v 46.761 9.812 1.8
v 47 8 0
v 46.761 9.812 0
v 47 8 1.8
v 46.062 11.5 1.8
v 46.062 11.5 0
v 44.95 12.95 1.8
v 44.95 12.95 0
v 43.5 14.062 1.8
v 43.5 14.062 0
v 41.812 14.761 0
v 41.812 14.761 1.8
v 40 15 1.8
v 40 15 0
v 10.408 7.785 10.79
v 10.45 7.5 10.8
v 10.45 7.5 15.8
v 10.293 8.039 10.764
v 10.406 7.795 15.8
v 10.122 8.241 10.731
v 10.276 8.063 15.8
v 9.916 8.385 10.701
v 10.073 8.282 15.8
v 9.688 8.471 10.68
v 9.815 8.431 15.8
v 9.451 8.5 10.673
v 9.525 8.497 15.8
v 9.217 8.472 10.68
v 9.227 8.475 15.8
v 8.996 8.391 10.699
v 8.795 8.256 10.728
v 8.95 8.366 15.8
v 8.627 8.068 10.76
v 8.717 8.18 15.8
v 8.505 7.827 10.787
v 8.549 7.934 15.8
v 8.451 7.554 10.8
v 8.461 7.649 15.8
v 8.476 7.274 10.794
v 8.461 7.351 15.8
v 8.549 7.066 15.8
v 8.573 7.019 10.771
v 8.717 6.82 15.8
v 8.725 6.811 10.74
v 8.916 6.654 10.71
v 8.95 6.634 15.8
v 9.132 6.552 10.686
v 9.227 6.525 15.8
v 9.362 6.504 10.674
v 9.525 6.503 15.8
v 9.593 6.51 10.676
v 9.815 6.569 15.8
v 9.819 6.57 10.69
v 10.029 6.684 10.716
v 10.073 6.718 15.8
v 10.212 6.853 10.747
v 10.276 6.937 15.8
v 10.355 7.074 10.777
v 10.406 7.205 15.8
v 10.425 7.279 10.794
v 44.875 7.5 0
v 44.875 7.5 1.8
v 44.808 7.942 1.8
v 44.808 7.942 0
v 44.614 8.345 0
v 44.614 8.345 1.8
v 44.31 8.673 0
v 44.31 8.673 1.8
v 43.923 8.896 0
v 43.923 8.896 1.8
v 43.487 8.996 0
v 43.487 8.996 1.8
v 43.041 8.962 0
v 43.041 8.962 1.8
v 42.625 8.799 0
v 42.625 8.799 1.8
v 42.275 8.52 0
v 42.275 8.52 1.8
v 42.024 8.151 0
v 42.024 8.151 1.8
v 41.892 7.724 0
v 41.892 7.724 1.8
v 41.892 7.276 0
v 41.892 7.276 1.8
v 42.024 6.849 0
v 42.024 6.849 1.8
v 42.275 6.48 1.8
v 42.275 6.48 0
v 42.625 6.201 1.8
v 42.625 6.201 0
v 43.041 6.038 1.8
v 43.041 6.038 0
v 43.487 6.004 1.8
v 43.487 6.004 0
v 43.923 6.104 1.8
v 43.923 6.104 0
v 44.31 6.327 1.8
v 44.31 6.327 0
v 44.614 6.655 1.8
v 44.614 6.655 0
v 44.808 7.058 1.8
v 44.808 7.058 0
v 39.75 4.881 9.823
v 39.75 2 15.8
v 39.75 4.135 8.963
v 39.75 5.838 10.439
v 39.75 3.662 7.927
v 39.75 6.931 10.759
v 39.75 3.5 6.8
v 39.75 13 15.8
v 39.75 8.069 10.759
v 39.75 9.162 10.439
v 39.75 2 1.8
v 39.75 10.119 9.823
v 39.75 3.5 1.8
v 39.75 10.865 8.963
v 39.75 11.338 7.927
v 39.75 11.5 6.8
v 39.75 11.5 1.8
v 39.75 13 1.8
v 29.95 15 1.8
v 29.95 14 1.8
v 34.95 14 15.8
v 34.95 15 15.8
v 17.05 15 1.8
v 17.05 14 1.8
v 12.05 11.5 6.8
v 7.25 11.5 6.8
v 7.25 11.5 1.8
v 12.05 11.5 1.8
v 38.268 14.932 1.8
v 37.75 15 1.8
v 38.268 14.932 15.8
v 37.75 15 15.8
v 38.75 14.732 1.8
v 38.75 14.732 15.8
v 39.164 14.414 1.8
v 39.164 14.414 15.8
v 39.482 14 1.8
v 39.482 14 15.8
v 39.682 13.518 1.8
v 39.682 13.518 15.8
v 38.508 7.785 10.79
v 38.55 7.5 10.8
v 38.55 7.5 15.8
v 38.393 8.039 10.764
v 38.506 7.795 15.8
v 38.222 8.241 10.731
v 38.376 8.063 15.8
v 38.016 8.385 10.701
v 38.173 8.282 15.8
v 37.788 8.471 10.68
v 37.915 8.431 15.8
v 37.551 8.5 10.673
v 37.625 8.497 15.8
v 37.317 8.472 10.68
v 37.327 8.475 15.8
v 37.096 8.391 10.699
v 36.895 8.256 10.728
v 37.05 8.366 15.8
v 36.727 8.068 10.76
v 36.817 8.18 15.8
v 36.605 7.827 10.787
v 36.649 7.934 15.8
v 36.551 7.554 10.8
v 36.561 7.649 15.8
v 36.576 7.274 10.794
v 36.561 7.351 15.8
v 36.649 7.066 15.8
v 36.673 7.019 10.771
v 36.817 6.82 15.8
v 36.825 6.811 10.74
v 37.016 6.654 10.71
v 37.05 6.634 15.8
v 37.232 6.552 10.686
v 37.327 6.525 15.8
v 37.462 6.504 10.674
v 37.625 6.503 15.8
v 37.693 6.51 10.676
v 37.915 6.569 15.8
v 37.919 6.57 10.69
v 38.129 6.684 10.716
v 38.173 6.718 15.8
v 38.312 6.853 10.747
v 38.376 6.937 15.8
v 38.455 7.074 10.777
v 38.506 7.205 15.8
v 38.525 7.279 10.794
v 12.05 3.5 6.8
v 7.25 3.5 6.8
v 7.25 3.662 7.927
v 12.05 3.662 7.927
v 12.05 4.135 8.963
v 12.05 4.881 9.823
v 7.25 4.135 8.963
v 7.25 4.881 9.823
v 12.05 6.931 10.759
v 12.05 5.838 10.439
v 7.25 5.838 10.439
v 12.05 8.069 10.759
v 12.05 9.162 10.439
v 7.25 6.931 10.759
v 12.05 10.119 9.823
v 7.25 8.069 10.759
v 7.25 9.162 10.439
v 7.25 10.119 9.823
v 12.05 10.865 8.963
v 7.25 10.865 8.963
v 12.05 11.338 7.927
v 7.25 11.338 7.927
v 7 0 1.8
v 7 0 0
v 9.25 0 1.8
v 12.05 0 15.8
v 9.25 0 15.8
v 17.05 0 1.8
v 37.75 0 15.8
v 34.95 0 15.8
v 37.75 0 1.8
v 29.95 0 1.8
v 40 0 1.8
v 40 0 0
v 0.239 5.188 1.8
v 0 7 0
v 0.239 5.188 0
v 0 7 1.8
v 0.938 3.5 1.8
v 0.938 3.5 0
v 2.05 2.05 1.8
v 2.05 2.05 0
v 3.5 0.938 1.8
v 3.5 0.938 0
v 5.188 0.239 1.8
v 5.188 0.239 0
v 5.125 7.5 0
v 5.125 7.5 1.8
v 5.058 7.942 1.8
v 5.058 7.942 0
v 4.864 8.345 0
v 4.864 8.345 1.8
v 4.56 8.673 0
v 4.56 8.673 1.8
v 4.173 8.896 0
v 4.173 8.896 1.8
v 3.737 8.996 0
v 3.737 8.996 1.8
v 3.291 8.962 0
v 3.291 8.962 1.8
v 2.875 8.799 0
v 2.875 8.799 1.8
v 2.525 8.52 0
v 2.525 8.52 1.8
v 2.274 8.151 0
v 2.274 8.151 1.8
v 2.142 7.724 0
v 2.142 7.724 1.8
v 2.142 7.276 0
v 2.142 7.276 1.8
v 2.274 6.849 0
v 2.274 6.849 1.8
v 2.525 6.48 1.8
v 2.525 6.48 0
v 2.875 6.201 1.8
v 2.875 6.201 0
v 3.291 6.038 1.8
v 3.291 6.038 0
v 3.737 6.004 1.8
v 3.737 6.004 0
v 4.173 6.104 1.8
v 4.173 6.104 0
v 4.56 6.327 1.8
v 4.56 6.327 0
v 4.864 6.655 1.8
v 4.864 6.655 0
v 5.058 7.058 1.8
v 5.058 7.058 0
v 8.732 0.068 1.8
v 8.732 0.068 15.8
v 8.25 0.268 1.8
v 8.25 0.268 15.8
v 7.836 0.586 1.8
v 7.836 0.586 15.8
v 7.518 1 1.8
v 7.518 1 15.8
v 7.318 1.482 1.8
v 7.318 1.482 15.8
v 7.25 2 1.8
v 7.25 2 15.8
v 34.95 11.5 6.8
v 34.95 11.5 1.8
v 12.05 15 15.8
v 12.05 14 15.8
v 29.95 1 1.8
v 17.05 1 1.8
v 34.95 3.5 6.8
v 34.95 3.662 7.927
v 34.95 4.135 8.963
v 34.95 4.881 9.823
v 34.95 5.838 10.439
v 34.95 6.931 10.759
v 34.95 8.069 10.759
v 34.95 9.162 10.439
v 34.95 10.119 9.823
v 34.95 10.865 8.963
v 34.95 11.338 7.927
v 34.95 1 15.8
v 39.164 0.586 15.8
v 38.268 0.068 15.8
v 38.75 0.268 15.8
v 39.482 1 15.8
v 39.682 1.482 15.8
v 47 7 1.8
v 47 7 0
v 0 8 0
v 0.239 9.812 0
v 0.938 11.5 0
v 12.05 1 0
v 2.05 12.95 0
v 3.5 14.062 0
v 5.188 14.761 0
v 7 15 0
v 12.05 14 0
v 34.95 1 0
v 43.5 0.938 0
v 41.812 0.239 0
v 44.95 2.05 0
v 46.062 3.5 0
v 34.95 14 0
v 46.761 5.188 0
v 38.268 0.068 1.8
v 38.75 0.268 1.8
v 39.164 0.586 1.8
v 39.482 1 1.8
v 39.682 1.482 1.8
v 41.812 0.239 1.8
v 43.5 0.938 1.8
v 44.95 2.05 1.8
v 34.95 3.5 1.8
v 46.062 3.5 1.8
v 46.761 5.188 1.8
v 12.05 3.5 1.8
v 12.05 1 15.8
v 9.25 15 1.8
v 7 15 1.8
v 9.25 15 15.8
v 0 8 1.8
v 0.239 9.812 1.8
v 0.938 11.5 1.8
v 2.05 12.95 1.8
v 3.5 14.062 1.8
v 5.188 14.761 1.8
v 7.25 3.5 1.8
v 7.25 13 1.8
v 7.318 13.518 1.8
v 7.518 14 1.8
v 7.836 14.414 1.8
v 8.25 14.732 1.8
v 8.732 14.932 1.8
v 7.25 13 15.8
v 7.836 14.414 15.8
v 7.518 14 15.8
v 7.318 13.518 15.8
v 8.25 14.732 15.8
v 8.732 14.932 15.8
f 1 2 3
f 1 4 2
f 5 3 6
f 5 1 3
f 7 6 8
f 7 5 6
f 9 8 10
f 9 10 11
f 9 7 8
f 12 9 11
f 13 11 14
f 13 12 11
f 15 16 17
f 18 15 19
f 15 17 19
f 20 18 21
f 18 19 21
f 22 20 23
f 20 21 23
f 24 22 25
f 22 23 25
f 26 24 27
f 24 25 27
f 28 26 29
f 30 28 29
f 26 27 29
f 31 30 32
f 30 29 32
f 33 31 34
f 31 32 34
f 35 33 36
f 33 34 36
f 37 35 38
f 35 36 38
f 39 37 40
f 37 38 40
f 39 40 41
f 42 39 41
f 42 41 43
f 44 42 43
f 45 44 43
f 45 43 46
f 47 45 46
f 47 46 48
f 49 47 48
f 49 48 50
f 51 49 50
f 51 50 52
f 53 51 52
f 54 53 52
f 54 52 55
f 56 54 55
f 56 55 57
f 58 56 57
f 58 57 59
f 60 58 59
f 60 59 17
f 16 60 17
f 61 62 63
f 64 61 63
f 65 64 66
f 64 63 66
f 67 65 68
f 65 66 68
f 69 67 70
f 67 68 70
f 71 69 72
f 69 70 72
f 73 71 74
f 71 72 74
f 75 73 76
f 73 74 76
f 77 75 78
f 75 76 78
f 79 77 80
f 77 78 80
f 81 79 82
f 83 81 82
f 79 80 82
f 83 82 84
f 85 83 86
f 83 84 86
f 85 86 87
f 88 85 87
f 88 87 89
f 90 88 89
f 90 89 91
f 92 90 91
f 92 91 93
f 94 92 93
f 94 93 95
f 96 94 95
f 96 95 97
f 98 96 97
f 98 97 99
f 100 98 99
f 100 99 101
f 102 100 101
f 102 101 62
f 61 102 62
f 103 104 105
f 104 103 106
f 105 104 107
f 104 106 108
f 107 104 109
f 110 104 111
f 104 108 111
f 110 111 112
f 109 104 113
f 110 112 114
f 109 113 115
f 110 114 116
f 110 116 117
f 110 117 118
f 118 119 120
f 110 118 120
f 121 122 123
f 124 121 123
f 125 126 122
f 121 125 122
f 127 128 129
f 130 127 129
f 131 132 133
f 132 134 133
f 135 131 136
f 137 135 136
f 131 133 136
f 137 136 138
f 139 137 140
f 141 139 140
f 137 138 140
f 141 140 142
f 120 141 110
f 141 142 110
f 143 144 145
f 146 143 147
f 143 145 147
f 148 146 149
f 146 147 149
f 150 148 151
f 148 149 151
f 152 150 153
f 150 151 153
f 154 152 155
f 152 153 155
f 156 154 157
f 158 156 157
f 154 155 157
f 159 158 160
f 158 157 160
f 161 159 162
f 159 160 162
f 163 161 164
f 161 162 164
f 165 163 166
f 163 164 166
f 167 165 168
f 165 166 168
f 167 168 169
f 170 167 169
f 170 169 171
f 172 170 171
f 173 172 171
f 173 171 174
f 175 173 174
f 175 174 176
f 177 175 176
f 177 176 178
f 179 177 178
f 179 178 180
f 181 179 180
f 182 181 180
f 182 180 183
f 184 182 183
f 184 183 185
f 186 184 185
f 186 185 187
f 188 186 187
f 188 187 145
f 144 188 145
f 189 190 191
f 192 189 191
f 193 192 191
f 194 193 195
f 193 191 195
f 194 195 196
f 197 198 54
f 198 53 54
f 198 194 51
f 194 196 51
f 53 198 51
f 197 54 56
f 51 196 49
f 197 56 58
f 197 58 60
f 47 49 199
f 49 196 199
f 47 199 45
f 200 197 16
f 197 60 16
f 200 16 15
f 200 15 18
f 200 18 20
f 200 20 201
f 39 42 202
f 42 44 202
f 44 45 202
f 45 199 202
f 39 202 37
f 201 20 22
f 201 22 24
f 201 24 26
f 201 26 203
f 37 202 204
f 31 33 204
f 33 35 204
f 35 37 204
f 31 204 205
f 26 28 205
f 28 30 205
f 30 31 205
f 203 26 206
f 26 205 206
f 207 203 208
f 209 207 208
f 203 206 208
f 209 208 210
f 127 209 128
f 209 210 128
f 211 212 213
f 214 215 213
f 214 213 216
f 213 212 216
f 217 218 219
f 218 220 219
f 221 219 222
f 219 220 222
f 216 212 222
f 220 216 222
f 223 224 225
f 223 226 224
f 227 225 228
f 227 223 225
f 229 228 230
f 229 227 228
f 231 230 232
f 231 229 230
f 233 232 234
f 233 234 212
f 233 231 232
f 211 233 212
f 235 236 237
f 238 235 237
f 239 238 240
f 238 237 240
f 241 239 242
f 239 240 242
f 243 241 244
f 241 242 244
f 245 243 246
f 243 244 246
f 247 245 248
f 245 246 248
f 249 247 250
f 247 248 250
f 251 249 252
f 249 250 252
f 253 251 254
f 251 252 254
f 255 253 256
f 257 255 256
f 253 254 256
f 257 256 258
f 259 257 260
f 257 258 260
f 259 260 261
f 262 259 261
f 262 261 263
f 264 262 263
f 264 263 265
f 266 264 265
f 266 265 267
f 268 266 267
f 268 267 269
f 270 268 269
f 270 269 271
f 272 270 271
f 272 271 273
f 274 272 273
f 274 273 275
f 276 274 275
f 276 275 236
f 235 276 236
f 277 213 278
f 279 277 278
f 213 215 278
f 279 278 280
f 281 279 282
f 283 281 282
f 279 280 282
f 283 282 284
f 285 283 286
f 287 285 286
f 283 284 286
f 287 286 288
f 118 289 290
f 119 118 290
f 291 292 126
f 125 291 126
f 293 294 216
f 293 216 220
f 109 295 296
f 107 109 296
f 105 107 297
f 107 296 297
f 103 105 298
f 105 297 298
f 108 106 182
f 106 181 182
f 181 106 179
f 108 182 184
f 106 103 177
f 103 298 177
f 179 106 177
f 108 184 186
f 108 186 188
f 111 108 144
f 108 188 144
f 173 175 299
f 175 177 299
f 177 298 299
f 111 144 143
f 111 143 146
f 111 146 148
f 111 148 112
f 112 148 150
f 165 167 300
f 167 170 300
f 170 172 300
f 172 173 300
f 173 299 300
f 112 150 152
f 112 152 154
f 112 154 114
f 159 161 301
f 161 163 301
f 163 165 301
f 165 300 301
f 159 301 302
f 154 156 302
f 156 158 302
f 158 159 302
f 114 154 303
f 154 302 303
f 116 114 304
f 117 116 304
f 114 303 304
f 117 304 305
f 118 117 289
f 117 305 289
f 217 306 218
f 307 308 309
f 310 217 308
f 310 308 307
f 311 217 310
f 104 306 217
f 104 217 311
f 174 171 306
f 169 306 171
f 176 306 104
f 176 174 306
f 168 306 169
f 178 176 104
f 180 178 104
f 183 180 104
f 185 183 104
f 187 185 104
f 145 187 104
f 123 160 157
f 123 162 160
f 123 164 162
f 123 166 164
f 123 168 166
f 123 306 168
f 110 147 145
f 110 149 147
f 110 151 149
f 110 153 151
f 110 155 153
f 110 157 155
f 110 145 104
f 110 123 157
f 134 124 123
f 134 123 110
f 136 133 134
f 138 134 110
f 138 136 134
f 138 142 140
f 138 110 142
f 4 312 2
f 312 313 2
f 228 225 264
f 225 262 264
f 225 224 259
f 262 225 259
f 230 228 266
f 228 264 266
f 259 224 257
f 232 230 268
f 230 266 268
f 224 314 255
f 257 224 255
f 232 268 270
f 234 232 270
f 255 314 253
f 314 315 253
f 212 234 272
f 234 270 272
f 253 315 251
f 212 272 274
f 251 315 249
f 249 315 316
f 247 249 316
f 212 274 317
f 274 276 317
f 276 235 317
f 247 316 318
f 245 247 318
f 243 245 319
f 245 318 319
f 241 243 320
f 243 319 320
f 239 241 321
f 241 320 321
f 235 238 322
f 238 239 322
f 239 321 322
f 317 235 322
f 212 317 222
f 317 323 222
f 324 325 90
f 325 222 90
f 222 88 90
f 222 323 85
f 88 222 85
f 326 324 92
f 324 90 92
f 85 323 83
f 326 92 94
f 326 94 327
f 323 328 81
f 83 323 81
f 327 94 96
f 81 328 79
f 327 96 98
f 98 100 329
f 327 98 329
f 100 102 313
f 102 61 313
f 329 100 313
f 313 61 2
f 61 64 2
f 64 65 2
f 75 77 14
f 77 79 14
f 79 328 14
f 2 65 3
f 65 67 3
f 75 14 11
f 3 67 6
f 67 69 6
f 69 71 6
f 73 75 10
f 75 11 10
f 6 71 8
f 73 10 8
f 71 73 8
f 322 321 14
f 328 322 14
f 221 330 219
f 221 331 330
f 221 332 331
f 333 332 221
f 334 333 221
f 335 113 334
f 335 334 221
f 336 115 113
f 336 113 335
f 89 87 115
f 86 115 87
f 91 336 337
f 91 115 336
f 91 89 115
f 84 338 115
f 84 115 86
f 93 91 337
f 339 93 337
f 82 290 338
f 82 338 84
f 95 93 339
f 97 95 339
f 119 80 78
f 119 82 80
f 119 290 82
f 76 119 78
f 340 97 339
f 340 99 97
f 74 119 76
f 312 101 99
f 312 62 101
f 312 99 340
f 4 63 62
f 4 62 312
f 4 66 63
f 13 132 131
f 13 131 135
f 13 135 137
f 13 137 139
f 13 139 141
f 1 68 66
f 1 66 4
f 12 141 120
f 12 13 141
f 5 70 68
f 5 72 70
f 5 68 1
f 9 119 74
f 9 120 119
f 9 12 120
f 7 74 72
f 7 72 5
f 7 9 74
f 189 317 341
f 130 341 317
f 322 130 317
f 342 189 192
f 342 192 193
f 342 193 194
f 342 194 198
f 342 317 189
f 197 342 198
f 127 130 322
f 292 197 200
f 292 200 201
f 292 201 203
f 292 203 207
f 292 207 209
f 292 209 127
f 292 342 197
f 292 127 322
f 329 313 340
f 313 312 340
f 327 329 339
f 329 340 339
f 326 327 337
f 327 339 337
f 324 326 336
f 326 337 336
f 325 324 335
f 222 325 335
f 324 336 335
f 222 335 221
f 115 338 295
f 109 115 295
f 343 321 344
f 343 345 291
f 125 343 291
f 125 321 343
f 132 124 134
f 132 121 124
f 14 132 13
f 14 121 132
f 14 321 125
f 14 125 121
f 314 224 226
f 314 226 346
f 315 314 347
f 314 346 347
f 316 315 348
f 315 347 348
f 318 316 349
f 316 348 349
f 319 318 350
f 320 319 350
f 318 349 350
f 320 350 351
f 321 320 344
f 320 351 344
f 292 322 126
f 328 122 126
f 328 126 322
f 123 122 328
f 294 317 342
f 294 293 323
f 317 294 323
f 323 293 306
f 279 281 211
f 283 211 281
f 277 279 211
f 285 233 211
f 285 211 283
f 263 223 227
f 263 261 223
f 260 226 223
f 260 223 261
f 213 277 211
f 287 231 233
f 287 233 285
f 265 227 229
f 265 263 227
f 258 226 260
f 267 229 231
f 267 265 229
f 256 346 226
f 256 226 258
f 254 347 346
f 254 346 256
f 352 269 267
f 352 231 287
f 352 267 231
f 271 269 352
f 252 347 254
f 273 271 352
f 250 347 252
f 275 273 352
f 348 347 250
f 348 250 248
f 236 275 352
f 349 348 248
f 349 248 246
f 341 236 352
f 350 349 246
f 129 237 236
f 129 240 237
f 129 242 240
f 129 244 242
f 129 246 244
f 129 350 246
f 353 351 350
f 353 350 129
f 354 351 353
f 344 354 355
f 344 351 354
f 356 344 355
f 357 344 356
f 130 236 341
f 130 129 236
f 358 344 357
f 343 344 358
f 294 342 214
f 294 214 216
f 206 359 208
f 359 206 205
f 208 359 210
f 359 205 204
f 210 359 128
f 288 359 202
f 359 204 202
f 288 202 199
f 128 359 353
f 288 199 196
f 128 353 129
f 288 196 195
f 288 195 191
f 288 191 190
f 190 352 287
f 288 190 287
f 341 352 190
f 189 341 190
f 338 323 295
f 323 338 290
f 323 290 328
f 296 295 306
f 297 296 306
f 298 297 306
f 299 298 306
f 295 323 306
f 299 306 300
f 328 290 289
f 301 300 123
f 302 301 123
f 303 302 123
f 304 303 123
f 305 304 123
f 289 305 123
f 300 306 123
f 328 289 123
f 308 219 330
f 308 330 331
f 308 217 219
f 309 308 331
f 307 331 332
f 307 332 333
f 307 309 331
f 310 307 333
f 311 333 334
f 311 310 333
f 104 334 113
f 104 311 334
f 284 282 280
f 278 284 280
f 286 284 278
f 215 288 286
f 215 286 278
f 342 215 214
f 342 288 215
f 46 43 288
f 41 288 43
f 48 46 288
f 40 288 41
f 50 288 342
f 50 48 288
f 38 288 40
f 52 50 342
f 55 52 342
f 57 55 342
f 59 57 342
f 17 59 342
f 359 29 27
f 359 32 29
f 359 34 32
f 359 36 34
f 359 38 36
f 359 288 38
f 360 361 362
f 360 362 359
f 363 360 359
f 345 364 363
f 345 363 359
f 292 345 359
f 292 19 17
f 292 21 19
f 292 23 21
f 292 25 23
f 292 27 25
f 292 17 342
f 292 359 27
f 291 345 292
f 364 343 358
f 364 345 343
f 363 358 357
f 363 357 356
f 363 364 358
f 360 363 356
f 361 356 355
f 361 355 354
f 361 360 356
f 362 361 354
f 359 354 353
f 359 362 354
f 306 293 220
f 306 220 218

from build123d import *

# Parameters (mm, degrees)
F0_W      = 47
F0_H      = 15
F1_DEPTH  = 1.8
F3_DEPTH  = 14
F4_W      = 22.9
F4_H      = 13
F5_DEPTH  = 15.801
F6_R      = 1
F7_DEPTH  = 7
F8_R      = 1.5
F9_R      = 1.5
F10_DEPTH = 1.801
F12_DEPTH = 39.751
F13_R     = 7
F15_DEPTH = 1.001
F16_DEPTH = 14.001
F17_R     = 2


with BuildPart() as f1:
    # F0 (on Top) → F1 (new body)
    with BuildSketch(Plane.XY):
        with Locations((23.5, 7.5)):
            Rectangle(F0_W, F0_H)
    extrude(amount=F1_DEPTH)

    # F2 (on face) → F3 (join)
    with BuildSketch(Plane.XY.offset(1.8)):
        Polygon((39.75, 15), (23.5, 15), (7.25, 15), (7.25, 0), (23.5, 0), (39.75, 0), align=None)
    extrude(amount=F3_DEPTH)

    # F4 (on face) → F5 (cut, through all)
    with BuildSketch(Plane.XY.offset(15.8)):
        with Locations((23.5, 7.5)):
            Rectangle(F4_W, F4_H)
    extrude(amount=-F5_DEPTH, mode=Mode.SUBTRACT)

    # F6 (on face) → F7 (cut)
    with BuildSketch(Plane.XY.offset(15.8)):
        with Locations((9.45, 7.5)):
            Circle(F6_R)
        with Locations((37.55, 7.5)):
            Circle(F6_R)
    extrude(amount=-F7_DEPTH, mode=Mode.SUBTRACT)

    # F8 (on face) + F9 (on face) → F10 (cut, through all)
    with BuildSketch(Plane.XY.offset(1.8)):
        with Locations((3.625, 7.5)):
            Circle(F8_R)
    with BuildSketch(Plane.XY.offset(1.8)):
        with Locations((43.375, 7.5)):
            Circle(F9_R)
    extrude(amount=-F10_DEPTH, mode=Mode.SUBTRACT)

    # F11 (on face) → F12 (cut, through all)
    with BuildSketch(Plane(origin=(7.25, 0, 0), x_dir=(0, -1, 0), z_dir=(-1, 0, 0))):
        with BuildLine():
            Line((-11.5, 1.8), (-3.5, 1.8))
            Line((-3.5, 1.8), (-3.5, 6.8))
            ThreePointArc((-3.5, 6.8), (-7.5, 10.8), (-11.5, 6.8))
            Line((-11.5, 6.8), (-11.5, 1.8))
        make_face()
    extrude(amount=-F12_DEPTH, mode=Mode.SUBTRACT)

    # F13
    f13_edges = [f1.edges().sort_by_distance(p)[0] for p in [
        (0, 15, 0.9),
        (0, 0, 0.9),
        (47, 0, 0.9),
        (47, 15, 0.9),
    ]]
    fillet(f13_edges, radius=F13_R)

    # F14 (on face) → F15 (cut, through all)
    with BuildSketch(Plane.XZ.offset(-14)):
        Polygon((34.95, 15.8), (12.05, 15.8), (17.05, 1.8), (29.95, 1.8), align=None)
    extrude(amount=-F15_DEPTH, mode=Mode.SUBTRACT)

    # F14 (on face) → F16 (cut, through all)
    with BuildSketch(Plane.XZ.offset(-14)):
        Polygon((34.95, 15.8), (12.05, 15.8), (17.05, 1.8), (29.95, 1.8), align=None)
    extrude(amount=F16_DEPTH, mode=Mode.SUBTRACT)

    # F17
    f17_edges = [f1.edges().sort_by_distance(p)[0] for p in [
        (39.75, 15, 8.8),
        (39.75, 0, 8.8),
        (7.25, 0, 8.8),
        (7.25, 15, 8.8),
    ]]
    fillet(f17_edges, radius=F17_R)


solid = f1.part
